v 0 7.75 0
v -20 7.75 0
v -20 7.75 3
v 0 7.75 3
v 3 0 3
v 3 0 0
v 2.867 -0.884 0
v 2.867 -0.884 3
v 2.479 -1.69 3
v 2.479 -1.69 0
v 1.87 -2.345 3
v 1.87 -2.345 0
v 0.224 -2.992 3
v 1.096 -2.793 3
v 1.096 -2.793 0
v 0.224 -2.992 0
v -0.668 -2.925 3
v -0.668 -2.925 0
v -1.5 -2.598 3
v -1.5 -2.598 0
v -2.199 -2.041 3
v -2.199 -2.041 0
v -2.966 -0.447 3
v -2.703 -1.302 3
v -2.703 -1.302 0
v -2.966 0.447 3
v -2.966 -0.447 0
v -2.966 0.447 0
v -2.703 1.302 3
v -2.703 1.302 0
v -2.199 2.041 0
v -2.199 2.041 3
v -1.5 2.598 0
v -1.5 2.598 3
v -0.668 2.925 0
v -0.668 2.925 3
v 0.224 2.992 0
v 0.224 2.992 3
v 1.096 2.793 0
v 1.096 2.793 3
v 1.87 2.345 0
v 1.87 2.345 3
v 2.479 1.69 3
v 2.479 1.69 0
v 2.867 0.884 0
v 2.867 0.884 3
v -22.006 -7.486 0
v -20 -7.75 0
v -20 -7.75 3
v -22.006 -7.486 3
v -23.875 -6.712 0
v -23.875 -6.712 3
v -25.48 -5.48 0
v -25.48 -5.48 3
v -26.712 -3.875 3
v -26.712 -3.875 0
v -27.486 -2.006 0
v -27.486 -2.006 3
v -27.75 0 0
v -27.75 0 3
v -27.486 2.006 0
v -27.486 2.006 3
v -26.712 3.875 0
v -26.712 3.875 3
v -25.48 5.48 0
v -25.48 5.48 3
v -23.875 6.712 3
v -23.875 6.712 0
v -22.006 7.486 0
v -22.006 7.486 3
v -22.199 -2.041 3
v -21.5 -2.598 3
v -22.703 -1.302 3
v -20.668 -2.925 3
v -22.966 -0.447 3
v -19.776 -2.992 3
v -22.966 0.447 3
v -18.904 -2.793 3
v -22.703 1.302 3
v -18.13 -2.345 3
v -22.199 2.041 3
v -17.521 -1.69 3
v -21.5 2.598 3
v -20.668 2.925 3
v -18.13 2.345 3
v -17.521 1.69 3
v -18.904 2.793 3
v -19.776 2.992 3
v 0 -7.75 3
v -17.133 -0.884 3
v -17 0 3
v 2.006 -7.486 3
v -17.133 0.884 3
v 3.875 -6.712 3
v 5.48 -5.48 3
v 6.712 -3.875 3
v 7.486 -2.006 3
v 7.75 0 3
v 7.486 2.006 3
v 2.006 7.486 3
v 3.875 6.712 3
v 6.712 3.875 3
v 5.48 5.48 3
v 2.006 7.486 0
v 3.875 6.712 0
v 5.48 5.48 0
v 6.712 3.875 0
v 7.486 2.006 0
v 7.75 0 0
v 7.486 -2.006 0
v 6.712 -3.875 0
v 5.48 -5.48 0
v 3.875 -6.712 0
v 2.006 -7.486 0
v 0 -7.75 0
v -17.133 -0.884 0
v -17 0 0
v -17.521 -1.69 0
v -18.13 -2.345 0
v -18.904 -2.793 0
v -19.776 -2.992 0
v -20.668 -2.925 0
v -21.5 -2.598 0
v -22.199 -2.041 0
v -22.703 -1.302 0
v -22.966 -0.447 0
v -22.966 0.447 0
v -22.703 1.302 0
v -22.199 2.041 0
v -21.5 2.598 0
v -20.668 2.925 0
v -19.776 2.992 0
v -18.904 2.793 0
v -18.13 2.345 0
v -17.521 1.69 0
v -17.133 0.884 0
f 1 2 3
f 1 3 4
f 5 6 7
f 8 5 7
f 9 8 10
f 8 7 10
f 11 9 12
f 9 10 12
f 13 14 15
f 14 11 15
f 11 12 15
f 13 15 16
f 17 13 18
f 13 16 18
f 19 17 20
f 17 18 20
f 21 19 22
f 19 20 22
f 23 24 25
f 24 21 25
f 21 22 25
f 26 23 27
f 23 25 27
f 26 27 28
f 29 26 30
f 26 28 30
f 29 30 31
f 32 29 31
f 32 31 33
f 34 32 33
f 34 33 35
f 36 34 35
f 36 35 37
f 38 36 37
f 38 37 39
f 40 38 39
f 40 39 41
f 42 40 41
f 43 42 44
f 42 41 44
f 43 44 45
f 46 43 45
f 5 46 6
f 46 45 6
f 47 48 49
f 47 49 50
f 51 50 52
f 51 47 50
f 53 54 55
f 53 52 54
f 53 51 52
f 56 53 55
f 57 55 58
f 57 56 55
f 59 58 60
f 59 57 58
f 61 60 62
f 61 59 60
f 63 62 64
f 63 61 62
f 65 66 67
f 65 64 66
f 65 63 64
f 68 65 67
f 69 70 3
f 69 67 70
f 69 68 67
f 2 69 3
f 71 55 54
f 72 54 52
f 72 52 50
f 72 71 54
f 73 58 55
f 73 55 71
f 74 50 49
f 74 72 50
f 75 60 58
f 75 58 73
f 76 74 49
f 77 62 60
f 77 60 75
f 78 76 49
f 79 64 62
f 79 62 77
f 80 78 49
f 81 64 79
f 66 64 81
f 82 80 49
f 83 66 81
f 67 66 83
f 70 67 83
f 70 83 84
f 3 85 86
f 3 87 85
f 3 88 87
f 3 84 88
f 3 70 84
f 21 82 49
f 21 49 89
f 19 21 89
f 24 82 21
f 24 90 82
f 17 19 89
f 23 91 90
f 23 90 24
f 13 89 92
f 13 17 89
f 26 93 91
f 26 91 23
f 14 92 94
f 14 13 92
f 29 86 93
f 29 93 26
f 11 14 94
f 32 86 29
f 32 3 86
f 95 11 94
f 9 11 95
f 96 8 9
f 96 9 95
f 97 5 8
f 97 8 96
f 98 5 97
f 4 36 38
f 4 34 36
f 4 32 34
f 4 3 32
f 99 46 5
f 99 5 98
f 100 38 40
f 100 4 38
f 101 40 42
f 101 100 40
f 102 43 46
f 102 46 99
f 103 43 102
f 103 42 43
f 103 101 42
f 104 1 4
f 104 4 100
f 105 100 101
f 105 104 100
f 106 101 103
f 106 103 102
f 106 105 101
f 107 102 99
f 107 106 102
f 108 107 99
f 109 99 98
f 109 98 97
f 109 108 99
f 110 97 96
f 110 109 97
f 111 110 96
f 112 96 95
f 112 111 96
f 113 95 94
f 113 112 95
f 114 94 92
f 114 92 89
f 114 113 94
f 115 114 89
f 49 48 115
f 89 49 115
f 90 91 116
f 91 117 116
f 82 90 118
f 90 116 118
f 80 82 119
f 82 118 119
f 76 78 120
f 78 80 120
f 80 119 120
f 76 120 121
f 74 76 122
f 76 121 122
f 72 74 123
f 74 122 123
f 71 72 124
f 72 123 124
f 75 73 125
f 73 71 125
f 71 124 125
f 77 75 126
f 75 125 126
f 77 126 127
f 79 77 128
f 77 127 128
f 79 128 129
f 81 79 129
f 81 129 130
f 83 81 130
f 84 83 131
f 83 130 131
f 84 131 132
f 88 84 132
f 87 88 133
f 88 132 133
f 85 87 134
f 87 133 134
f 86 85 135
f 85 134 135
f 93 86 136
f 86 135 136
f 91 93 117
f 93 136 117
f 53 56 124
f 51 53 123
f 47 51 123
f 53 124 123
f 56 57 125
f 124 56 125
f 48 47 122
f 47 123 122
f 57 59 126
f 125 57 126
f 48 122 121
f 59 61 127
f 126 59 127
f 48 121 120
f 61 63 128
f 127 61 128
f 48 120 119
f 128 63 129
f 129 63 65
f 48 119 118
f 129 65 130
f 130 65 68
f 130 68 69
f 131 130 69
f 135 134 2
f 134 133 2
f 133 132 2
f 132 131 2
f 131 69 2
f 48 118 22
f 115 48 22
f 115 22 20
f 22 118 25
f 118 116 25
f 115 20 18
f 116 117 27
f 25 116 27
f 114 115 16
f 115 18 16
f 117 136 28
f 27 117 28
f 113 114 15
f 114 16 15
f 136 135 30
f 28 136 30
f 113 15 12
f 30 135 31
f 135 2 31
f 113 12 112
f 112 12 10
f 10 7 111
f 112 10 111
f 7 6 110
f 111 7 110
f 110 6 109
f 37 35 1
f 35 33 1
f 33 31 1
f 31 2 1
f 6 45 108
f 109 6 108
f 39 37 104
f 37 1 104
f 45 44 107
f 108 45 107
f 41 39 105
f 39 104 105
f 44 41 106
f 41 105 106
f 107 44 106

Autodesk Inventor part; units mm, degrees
ref_plane "YZ Plane" through (0, 0, 0) normal (1, 0, 0) x (0, 1, 0)
ref_plane "XZ Plane" through (0, 0, 0) normal (0, 1, 0) x (-1, 0, 0)
ref_plane "XY Plane" through (0, 0, 0) normal (0, 0, 1) x (1, 0, 0)
sketch "Base" plane through (0, 0, 0) normal (0, 0, 1) x (1, 0, 0)
  circle A0 centre (0, 0) radius 7.75
  line L0 (0, 0) -> (-20, 0) construction
  circle A1 centre (-20, 0) radius 7.75
  circle A2 centre (0, 0) radius 3
  circle A3 centre (-20, 0) radius 3
  line L1 (-20, 7.75) -> (0, 7.75)
  line L2 (-20, -7.75) -> (0, -7.75)
  dimension "d0" = 15.5
  dimension "d1" = 20
  dimension "d3" = 6
extrude "BaseFeature" add sketch "Base" along normal blind 3
properties part number "FaceTubeConnector"
